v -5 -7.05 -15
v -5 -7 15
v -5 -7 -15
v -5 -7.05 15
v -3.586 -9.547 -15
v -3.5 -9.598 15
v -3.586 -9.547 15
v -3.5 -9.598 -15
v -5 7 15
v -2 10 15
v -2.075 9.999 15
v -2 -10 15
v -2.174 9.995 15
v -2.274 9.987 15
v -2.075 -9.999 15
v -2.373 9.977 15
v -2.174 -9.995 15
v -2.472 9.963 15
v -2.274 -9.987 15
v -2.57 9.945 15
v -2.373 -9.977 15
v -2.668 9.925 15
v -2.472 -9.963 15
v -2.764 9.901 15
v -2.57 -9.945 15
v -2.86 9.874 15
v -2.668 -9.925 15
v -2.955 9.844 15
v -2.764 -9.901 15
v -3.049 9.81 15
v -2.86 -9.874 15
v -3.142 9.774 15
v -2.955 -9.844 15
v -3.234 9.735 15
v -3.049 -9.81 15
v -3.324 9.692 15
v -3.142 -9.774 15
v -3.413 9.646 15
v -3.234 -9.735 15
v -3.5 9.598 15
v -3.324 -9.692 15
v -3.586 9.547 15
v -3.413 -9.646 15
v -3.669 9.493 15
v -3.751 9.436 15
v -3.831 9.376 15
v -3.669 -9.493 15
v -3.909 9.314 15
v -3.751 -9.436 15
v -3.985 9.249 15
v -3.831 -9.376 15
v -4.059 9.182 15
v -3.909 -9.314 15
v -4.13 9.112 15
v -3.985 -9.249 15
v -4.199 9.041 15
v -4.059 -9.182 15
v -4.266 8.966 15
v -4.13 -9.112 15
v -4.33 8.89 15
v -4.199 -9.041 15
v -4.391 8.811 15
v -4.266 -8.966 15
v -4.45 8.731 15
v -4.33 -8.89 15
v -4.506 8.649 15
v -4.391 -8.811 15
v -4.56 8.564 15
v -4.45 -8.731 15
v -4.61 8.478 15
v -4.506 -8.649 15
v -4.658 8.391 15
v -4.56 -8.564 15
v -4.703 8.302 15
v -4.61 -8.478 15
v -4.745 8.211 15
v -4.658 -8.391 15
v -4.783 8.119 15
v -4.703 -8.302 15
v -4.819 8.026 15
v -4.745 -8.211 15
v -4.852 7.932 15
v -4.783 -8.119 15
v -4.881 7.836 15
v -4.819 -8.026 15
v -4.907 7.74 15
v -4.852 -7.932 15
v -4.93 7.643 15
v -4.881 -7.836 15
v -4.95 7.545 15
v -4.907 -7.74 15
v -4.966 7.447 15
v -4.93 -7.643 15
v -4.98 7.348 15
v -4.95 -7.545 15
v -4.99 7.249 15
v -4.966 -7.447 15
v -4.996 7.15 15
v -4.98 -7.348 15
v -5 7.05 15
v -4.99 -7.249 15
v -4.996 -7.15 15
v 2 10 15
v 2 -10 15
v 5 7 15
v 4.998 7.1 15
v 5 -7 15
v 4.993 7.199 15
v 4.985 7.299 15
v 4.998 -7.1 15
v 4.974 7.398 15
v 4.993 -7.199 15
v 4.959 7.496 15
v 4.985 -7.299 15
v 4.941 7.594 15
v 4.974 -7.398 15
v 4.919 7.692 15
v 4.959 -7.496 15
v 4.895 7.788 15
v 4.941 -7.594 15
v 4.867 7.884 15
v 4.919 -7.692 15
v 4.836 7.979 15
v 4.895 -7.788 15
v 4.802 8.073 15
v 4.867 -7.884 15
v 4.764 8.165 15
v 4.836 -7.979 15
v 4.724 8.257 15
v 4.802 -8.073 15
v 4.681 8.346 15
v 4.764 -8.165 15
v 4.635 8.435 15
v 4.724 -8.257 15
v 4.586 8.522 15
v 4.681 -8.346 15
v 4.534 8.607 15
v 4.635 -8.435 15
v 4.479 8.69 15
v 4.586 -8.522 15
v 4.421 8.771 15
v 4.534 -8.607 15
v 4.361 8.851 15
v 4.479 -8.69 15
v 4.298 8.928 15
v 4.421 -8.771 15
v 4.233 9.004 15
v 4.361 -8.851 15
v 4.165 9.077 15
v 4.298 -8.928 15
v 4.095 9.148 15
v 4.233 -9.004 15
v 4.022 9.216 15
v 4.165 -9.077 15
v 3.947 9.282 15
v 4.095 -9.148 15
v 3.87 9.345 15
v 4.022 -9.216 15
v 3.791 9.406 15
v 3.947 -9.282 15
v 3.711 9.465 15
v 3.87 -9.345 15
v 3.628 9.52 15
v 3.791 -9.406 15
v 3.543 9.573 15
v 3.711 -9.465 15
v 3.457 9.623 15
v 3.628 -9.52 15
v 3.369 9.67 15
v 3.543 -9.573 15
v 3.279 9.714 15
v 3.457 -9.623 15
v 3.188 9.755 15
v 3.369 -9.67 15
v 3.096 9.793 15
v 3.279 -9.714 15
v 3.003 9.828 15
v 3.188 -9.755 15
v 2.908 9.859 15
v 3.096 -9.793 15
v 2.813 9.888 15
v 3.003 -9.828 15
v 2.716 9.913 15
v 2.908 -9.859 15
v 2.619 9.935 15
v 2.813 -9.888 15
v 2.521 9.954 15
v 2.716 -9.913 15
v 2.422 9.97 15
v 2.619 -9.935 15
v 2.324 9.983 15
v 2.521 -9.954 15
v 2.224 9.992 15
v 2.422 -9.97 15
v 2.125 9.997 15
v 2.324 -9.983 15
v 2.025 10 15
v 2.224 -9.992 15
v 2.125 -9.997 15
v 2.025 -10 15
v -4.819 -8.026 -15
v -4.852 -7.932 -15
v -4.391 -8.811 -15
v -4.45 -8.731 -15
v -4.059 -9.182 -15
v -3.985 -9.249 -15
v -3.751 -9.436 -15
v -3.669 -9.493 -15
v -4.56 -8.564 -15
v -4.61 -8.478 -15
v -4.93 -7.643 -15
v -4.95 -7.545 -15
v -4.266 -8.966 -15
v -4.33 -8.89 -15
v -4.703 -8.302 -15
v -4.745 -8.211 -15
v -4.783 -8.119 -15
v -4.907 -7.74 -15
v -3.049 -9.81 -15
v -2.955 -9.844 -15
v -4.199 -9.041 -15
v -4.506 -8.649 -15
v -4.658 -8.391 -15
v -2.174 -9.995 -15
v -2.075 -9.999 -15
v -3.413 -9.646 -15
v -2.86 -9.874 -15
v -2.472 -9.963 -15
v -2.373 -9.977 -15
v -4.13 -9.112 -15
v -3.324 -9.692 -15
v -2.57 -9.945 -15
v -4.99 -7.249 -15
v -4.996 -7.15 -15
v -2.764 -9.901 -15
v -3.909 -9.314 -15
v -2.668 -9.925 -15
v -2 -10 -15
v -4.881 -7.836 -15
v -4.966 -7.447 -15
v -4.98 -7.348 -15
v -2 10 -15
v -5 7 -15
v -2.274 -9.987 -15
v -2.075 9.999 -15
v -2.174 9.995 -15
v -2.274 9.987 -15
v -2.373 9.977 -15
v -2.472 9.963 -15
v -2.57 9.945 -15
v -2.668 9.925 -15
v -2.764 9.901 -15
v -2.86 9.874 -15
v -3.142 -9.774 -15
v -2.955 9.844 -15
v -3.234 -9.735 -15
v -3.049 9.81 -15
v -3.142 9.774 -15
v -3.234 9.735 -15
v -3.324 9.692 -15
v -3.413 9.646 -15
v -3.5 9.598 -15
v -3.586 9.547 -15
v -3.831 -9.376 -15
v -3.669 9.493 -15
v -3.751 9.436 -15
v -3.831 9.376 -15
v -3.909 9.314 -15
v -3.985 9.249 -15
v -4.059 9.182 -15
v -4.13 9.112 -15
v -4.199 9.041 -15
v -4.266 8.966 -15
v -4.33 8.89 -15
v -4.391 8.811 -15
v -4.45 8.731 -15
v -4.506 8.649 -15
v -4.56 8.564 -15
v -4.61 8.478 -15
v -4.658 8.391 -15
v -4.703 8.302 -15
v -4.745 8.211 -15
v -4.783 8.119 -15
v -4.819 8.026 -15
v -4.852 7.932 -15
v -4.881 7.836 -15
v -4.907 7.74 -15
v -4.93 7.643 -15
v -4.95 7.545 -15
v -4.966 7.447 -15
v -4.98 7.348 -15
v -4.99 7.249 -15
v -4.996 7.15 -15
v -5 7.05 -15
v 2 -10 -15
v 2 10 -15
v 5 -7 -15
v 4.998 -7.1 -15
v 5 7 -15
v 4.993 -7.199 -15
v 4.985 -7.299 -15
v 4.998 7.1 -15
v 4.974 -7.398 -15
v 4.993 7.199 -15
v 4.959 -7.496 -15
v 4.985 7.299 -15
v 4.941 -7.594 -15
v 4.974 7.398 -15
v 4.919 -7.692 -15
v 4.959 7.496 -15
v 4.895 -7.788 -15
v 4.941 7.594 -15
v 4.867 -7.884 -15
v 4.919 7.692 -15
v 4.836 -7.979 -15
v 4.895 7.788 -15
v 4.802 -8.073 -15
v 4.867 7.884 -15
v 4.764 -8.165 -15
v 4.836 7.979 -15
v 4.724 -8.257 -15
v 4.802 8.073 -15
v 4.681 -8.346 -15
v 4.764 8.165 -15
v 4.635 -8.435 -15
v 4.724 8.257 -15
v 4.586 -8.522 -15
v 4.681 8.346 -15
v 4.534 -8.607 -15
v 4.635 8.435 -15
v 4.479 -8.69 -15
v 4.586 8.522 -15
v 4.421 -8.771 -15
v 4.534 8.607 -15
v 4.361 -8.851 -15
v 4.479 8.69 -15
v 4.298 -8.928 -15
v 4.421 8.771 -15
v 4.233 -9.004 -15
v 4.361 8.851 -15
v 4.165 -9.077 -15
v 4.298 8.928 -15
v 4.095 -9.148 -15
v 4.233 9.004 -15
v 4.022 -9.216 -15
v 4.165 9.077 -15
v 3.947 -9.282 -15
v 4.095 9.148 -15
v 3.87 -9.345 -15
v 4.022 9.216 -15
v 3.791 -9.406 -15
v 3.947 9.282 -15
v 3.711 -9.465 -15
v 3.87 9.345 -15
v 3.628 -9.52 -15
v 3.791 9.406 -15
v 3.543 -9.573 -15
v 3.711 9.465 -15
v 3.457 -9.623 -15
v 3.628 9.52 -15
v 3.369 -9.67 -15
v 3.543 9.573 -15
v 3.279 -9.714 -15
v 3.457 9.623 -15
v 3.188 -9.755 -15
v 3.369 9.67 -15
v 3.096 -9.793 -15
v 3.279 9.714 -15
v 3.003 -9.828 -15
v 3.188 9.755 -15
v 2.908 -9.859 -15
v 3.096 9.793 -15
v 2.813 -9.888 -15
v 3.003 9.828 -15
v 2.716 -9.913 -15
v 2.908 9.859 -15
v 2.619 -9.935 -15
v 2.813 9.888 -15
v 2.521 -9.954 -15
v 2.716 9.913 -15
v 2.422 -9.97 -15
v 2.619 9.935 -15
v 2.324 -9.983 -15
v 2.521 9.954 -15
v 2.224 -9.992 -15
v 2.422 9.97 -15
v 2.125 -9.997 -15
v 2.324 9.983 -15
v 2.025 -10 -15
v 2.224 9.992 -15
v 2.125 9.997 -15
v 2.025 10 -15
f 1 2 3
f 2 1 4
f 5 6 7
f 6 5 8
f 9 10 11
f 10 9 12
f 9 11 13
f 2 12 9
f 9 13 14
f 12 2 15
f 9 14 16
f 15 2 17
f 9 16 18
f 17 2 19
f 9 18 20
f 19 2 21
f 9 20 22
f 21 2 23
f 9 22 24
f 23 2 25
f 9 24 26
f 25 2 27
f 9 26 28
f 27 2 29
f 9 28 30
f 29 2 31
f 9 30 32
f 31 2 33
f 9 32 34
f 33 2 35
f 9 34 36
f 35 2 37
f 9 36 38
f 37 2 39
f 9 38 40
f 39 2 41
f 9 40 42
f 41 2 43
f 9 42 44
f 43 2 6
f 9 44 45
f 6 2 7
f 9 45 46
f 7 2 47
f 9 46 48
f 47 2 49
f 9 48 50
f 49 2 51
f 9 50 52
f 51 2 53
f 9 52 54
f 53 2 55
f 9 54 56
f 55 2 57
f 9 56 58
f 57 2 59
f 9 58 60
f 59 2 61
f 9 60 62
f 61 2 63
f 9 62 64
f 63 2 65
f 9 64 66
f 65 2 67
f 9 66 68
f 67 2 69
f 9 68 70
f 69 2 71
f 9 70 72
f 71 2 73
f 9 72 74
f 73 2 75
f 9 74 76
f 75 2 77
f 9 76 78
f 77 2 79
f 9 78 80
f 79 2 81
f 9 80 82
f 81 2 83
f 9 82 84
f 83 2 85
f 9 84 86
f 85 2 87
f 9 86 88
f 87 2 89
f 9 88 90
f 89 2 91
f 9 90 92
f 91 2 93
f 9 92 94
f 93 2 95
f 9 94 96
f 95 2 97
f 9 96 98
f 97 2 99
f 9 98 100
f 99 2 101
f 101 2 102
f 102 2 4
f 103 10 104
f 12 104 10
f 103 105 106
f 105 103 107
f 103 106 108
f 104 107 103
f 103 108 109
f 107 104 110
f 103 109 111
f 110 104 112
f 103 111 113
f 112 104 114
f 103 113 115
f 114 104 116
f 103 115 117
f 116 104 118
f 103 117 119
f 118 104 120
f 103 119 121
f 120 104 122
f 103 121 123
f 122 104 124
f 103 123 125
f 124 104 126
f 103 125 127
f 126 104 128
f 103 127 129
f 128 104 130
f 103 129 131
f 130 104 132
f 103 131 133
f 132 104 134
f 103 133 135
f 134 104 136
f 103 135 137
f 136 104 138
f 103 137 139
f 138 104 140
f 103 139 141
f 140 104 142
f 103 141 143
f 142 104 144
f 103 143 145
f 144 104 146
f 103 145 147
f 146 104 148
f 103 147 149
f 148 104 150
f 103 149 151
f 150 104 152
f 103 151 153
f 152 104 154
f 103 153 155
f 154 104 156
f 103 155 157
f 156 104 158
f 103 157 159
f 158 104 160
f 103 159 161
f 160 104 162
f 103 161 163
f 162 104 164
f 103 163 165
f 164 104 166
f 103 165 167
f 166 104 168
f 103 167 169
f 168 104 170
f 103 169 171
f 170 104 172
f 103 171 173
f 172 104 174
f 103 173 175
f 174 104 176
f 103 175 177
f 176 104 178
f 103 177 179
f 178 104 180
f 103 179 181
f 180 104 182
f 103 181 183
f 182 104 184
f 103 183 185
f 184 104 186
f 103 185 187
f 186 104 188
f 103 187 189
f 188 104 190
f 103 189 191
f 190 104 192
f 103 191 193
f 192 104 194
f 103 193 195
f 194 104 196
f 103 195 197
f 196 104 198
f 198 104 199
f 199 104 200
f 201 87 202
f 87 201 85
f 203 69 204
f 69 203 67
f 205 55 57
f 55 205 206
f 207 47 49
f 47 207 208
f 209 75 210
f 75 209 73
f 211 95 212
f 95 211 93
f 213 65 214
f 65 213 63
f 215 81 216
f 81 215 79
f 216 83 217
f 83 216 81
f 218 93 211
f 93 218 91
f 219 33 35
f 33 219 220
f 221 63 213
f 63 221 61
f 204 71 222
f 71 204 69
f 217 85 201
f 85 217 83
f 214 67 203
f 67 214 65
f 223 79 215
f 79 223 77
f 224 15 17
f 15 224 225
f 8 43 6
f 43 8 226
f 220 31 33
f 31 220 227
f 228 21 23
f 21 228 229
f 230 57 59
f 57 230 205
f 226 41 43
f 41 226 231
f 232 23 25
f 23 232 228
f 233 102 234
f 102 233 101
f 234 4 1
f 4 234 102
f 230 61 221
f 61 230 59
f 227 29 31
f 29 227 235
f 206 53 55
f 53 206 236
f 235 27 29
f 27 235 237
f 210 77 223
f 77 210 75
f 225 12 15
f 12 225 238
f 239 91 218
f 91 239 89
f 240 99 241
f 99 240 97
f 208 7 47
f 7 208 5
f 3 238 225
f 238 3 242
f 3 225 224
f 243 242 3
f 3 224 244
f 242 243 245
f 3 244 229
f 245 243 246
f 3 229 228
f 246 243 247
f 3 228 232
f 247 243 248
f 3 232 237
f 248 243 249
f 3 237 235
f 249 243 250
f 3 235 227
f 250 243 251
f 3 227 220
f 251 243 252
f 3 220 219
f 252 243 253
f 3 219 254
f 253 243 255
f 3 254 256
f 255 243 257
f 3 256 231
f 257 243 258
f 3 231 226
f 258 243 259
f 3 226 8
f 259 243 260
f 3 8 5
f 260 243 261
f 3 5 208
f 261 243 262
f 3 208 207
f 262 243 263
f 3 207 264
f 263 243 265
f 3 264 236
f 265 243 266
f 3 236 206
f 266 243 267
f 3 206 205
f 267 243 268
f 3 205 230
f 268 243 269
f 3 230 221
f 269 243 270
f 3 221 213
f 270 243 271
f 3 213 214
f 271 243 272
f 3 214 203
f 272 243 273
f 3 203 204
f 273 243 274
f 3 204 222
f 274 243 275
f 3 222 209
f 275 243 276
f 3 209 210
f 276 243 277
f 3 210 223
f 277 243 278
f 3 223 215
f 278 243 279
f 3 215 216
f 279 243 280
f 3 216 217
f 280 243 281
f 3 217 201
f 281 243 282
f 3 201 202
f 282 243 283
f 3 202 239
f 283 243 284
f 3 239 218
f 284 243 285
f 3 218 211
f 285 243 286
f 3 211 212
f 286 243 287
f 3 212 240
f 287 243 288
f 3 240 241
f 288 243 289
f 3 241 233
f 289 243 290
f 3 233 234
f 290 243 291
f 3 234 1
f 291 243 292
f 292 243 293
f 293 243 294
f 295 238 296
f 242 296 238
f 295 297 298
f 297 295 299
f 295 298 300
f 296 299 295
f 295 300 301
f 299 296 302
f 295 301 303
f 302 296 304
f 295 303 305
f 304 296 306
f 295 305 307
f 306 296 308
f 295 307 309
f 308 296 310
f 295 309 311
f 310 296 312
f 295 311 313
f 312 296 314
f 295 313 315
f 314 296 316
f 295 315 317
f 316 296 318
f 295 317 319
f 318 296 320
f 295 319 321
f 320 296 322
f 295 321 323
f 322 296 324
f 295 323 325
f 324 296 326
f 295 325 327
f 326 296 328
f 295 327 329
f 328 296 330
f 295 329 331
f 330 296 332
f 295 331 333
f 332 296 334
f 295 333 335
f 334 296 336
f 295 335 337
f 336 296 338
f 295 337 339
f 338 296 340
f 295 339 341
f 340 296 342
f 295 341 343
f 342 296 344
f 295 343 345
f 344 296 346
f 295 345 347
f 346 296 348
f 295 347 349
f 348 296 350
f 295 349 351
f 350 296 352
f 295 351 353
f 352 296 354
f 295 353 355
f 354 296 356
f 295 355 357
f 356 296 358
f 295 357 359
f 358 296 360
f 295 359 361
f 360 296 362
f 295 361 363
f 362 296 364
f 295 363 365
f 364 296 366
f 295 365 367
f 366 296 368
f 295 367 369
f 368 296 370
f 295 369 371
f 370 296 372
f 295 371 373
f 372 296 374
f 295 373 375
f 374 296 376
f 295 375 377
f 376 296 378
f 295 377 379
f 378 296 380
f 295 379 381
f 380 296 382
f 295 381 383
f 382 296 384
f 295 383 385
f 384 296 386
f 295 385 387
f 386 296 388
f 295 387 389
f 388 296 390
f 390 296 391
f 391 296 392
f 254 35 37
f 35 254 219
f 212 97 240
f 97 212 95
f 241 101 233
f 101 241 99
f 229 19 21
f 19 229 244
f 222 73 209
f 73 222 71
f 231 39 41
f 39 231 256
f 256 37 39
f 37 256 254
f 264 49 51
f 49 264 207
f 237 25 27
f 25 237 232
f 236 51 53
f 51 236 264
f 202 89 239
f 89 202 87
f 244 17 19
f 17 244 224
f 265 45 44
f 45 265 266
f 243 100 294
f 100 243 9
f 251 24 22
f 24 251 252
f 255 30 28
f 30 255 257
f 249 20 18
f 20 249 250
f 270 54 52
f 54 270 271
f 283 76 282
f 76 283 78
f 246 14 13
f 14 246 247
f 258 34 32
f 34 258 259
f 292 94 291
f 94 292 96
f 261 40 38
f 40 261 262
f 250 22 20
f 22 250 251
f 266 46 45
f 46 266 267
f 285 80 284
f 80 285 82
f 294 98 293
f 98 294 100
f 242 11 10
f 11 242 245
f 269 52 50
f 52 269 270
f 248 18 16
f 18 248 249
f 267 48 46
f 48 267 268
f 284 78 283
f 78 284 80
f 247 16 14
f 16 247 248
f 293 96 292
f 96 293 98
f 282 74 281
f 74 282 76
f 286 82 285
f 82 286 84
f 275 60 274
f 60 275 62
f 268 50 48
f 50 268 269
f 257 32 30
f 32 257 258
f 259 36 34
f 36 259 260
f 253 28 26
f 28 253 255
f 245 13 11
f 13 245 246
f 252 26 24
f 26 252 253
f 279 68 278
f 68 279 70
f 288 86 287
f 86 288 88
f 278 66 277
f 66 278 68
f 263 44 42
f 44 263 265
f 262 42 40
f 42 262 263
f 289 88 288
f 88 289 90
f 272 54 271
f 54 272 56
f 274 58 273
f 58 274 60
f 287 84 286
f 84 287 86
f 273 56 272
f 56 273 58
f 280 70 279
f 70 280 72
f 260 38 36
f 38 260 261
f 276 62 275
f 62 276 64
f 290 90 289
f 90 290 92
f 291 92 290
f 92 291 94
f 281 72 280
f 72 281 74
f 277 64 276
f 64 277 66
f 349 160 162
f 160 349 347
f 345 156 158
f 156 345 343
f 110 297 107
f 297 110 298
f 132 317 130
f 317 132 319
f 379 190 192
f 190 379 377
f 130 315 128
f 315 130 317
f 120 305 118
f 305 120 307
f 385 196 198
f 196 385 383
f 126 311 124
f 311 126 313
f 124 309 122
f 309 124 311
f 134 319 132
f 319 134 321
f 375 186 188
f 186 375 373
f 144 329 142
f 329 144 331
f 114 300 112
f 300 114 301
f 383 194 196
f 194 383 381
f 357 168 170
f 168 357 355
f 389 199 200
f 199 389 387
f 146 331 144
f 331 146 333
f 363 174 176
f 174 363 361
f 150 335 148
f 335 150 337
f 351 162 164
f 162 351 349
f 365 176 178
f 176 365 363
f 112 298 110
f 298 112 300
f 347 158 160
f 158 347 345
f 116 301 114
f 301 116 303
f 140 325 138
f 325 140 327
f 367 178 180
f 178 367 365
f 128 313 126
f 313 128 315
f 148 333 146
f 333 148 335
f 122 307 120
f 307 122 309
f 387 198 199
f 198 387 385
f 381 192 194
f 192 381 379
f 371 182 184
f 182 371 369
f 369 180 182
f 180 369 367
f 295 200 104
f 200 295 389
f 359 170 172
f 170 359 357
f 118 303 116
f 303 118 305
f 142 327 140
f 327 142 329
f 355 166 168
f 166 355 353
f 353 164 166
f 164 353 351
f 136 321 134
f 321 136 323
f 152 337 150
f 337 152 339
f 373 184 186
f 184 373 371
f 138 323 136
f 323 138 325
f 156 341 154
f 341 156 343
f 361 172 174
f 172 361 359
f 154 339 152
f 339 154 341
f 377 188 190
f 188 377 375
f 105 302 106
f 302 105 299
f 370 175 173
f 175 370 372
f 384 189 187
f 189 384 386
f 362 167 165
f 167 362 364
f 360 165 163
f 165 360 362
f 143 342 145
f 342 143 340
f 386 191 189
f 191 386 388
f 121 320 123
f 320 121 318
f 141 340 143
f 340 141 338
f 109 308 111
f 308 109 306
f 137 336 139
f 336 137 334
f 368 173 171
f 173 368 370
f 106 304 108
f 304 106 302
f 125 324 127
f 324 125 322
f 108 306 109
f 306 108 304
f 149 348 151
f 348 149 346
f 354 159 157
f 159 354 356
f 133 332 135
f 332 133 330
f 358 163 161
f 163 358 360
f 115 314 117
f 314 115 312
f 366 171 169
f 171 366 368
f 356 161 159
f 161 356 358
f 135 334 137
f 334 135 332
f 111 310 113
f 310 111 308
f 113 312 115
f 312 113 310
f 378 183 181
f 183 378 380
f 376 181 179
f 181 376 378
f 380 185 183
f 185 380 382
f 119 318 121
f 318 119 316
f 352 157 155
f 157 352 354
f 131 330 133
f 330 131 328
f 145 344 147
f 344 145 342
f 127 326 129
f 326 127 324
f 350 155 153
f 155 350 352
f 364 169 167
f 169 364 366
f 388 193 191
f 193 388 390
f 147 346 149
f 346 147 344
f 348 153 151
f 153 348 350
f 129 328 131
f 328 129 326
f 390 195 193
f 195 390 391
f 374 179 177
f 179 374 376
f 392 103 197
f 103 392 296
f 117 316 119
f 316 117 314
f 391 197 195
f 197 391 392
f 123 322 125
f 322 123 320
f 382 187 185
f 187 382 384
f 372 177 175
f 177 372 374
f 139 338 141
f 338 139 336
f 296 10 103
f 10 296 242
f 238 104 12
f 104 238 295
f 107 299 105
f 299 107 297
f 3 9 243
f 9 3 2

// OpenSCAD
$fa=1;
$fs=0.1;
use <MCAD/boxes.scad>
roundedBox(size=[10,20,30],radius=3,sidesonly=true);
